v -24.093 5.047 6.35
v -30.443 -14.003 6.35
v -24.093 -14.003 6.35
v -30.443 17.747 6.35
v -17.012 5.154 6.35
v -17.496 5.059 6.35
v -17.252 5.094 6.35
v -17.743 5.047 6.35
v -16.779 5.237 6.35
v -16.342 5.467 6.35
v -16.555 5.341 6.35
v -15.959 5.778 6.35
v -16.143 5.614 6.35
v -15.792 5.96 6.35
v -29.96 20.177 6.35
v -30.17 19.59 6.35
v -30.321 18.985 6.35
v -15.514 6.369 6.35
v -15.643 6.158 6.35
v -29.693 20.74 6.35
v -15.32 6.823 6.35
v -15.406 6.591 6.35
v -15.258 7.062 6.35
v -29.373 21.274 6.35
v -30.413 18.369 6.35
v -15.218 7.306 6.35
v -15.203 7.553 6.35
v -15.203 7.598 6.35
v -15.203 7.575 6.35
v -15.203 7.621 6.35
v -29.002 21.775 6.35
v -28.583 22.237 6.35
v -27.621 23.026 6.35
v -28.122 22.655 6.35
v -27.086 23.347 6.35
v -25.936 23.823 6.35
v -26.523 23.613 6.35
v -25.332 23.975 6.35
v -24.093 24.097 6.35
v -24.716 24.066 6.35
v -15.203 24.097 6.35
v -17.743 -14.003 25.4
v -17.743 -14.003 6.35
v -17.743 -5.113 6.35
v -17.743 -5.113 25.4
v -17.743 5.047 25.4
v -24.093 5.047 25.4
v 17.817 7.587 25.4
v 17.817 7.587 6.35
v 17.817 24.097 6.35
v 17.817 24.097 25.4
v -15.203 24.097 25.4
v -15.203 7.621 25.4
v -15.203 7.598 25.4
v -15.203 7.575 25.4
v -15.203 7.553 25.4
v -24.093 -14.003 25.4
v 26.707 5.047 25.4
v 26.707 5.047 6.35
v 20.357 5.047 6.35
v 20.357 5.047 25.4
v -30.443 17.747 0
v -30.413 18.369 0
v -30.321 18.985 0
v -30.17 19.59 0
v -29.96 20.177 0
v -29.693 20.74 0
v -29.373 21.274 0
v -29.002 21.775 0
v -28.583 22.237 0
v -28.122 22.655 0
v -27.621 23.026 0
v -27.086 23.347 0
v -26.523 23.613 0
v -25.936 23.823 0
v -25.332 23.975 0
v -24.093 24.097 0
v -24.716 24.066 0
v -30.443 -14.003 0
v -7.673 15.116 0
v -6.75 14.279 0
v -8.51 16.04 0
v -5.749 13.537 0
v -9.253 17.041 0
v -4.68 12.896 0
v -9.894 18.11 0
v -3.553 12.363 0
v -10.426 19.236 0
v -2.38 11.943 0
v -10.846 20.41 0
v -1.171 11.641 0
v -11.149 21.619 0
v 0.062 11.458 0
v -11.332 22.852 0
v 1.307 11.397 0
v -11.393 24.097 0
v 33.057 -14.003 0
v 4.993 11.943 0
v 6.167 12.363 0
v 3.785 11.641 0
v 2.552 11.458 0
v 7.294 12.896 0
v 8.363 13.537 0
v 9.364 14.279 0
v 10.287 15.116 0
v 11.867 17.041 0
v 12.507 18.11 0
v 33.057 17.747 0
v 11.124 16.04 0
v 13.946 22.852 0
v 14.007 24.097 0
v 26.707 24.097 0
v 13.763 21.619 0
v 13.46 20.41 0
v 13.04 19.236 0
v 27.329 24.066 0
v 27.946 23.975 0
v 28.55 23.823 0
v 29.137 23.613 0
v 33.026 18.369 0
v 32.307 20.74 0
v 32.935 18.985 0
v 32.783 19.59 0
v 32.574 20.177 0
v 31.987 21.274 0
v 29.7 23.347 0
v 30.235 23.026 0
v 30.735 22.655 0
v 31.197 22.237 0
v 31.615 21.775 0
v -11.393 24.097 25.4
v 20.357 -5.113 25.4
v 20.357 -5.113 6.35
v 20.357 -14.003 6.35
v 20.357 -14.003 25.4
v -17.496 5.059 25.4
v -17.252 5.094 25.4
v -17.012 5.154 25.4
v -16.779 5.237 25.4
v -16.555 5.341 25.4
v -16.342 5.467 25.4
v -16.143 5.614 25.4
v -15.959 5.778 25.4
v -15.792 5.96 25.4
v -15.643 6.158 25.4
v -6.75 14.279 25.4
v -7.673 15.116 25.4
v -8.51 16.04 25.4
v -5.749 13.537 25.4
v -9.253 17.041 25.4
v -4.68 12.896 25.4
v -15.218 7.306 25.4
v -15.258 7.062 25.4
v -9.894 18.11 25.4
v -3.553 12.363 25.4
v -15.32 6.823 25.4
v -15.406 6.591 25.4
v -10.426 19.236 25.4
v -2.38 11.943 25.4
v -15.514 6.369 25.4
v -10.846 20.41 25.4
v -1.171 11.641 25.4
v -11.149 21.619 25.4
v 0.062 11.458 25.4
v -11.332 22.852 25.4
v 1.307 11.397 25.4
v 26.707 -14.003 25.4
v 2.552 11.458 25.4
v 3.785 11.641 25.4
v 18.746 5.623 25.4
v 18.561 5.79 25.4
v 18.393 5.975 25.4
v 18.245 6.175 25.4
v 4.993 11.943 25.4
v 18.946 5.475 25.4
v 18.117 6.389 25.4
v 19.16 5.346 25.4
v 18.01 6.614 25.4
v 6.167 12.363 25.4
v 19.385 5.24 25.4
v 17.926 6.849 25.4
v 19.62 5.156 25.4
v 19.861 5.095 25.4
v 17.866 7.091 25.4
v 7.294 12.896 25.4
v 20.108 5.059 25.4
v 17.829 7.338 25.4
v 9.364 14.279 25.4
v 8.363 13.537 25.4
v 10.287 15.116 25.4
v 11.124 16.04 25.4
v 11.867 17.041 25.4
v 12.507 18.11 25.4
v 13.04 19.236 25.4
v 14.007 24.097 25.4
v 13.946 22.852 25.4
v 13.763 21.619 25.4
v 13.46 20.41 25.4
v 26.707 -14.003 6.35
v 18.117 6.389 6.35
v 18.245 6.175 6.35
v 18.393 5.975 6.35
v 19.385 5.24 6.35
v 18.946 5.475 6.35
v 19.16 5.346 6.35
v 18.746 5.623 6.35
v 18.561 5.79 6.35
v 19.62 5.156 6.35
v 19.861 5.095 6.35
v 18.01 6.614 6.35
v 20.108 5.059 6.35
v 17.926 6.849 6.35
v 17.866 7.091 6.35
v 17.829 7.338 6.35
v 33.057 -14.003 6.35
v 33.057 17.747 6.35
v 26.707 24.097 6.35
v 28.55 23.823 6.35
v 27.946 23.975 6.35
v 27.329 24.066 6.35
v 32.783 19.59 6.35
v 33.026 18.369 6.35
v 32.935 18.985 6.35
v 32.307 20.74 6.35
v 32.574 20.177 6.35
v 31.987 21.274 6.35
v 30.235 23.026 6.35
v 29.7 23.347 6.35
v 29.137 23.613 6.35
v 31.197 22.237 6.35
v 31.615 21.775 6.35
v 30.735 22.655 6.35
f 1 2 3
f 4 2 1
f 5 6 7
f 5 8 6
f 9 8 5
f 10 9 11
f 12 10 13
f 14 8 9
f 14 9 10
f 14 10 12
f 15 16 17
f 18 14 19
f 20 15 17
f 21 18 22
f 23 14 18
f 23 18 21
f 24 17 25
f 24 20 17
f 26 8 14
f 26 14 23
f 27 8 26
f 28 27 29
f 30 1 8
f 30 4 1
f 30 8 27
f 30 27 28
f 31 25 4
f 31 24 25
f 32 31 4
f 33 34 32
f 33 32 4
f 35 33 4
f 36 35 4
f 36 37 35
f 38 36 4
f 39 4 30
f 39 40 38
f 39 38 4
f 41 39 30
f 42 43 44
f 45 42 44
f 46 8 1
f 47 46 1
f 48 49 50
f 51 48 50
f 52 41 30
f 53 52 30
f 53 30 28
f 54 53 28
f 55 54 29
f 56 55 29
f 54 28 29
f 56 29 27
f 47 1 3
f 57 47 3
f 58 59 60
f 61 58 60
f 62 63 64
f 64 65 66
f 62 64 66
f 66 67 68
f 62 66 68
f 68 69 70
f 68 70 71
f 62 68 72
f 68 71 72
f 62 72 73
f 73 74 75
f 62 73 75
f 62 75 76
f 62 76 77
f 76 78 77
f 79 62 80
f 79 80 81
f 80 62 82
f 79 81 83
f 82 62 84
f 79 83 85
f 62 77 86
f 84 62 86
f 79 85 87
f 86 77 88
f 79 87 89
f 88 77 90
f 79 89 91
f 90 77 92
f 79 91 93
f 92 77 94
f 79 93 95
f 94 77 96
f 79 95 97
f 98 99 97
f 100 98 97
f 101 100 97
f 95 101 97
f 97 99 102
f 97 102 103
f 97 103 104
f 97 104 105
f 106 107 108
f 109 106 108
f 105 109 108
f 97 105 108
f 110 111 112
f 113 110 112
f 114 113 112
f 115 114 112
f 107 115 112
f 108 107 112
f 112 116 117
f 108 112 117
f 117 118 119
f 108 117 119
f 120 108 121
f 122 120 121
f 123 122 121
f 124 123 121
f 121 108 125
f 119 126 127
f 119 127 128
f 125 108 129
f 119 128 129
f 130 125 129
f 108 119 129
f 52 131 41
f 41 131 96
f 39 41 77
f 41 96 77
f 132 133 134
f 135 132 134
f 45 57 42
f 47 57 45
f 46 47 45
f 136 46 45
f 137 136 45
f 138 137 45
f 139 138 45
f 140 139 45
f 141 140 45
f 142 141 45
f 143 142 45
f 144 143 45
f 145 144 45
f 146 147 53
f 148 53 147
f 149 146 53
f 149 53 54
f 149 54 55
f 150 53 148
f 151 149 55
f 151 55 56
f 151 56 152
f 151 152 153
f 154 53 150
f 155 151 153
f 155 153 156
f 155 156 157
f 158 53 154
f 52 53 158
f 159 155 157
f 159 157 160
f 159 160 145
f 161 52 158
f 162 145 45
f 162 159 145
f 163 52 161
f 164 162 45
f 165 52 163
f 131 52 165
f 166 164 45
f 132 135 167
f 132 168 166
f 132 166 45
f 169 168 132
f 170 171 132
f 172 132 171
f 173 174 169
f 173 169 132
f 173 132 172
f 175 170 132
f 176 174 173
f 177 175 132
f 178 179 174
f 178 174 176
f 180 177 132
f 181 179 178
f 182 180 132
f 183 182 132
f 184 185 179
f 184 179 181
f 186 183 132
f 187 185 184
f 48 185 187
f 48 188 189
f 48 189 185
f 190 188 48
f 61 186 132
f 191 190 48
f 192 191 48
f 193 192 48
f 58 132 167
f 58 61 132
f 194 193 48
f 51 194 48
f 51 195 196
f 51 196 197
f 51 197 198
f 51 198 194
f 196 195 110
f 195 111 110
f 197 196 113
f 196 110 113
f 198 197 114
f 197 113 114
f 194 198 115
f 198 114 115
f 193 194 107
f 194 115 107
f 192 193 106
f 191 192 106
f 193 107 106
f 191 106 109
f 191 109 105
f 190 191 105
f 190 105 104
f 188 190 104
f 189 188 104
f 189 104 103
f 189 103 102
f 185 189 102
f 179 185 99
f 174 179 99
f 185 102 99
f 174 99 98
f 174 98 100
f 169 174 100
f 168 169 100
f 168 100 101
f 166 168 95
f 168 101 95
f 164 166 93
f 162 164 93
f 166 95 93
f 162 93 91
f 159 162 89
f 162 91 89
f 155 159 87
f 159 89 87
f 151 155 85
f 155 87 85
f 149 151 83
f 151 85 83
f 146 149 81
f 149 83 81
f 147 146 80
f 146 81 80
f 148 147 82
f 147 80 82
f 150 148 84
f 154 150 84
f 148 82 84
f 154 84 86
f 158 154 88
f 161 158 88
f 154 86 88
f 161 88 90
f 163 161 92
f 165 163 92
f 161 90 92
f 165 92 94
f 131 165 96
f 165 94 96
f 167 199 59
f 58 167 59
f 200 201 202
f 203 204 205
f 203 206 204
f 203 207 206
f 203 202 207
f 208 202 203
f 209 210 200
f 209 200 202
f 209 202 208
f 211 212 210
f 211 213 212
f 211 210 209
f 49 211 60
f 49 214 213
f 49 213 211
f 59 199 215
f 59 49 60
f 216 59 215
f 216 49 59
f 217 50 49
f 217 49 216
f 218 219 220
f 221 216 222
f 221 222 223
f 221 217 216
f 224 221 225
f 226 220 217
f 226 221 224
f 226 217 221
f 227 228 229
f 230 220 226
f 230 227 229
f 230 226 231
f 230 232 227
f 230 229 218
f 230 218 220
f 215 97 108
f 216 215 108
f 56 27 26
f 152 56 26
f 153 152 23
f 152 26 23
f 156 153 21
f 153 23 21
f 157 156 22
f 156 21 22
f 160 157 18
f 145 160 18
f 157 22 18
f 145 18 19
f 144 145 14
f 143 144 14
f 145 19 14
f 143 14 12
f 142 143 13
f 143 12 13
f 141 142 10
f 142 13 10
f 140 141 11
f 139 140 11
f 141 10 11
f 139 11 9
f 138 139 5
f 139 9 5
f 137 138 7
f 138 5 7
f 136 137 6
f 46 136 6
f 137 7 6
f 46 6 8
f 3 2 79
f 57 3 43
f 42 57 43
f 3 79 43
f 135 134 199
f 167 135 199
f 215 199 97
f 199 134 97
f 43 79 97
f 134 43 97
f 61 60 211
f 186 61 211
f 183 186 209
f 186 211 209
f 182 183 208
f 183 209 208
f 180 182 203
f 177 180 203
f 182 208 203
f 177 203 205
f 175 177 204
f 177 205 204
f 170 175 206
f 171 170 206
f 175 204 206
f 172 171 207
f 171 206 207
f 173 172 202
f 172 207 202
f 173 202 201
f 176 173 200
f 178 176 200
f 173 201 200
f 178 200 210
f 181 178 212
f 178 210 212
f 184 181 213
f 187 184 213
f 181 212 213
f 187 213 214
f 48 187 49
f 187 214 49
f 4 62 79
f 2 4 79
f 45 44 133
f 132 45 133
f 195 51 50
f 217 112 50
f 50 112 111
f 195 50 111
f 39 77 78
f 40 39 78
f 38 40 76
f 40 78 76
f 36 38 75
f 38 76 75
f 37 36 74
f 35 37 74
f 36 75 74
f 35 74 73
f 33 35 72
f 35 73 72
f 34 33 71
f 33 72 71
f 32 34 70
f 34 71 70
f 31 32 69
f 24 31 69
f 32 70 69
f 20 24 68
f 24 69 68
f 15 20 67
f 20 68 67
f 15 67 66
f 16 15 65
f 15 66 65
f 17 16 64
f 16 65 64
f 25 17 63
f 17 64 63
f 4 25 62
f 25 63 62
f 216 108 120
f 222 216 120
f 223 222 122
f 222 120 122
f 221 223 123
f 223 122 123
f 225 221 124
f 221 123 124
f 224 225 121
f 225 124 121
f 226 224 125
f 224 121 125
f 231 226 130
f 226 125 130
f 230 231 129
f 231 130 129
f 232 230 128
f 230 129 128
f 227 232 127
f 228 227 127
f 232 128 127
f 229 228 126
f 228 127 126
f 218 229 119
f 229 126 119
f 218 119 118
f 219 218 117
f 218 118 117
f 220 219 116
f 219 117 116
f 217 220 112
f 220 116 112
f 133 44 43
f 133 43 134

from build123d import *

# Parameters (mm, degrees)
F1_DEPTH = 6.35
F3_DEPTH = 19.05


with BuildPart() as f1:
    # F0 (on Top) → F1 (new body)
    with BuildSketch(Plane.XY):
        with BuildLine():
            Line((-11.39312, 24.096514), (-24.09312, 24.096514))
            ThreePointArc((-24.09312, 24.096514), (-28.583248, 22.236642), (-30.44312, 17.746514))
            Line((-30.44312, 17.746514), (-30.44312, -14.003486))
            Line((-30.44312, -14.003486), (33.05688, -14.003486))
            Line((33.05688, -14.003486), (33.05688, 17.746514))
            ThreePointArc((33.05688, 17.746514), (31.197008, 22.236642), (26.70688, 24.096514))
            Line((26.70688, 24.096514), (14.00688, 24.096514))
            ThreePointArc((14.00688, 24.096514), (1.30688, 11.396514), (-11.39312, 24.096514))
        make_face()
    extrude(amount=F1_DEPTH)

    # F2 (on face) → F3 (join)
    with BuildSketch(Plane.XY.offset(6.35)):
        with BuildLine():
            Line((-24.09312, 5.046514), (-24.09312, -14.003486))
            Line((-24.09312, -14.003486), (-17.74312, -14.003486))
            Line((-17.74312, -14.003486), (-17.74312, -5.113486))
            Line((-17.74312, -5.113486), (20.35688, -5.113486))
            Line((20.35688, -5.113486), (20.35688, -14.003486))
            Line((20.35688, -14.003486), (26.70688, -14.003486))
            Line((26.70688, -14.003486), (26.70688, 5.046514))
            Line((26.70688, 5.046514), (20.35688, 5.046514))
            ThreePointArc((20.35688, 5.046514), (18.560829, 5.790463), (17.81688, 7.586514))
            Line((17.81688, 7.586514), (17.81688, 24.096514))
            Line((17.81688, 24.096514), (14.00688, 24.096514))
            ThreePointArc((14.00688, 24.096514), (1.30688, 11.396514), (-11.39312, 24.096514))
            Line((-11.39312, 24.096514), (-15.20312, 24.096514))
            Line((-15.20312, 24.096514), (-15.20312, 7.620516))
            ThreePointArc((-15.20312, 7.620516), (-15.202892, 7.586514), (-15.20312, 7.552512))
            ThreePointArc((-15.20312, 7.552512), (-15.958984, 5.778401), (-17.74312, 5.046514))
            Line((-17.74312, 5.046514), (-24.09312, 5.046514))
        make_face()
    extrude(amount=F3_DEPTH)


solid = f1.part
